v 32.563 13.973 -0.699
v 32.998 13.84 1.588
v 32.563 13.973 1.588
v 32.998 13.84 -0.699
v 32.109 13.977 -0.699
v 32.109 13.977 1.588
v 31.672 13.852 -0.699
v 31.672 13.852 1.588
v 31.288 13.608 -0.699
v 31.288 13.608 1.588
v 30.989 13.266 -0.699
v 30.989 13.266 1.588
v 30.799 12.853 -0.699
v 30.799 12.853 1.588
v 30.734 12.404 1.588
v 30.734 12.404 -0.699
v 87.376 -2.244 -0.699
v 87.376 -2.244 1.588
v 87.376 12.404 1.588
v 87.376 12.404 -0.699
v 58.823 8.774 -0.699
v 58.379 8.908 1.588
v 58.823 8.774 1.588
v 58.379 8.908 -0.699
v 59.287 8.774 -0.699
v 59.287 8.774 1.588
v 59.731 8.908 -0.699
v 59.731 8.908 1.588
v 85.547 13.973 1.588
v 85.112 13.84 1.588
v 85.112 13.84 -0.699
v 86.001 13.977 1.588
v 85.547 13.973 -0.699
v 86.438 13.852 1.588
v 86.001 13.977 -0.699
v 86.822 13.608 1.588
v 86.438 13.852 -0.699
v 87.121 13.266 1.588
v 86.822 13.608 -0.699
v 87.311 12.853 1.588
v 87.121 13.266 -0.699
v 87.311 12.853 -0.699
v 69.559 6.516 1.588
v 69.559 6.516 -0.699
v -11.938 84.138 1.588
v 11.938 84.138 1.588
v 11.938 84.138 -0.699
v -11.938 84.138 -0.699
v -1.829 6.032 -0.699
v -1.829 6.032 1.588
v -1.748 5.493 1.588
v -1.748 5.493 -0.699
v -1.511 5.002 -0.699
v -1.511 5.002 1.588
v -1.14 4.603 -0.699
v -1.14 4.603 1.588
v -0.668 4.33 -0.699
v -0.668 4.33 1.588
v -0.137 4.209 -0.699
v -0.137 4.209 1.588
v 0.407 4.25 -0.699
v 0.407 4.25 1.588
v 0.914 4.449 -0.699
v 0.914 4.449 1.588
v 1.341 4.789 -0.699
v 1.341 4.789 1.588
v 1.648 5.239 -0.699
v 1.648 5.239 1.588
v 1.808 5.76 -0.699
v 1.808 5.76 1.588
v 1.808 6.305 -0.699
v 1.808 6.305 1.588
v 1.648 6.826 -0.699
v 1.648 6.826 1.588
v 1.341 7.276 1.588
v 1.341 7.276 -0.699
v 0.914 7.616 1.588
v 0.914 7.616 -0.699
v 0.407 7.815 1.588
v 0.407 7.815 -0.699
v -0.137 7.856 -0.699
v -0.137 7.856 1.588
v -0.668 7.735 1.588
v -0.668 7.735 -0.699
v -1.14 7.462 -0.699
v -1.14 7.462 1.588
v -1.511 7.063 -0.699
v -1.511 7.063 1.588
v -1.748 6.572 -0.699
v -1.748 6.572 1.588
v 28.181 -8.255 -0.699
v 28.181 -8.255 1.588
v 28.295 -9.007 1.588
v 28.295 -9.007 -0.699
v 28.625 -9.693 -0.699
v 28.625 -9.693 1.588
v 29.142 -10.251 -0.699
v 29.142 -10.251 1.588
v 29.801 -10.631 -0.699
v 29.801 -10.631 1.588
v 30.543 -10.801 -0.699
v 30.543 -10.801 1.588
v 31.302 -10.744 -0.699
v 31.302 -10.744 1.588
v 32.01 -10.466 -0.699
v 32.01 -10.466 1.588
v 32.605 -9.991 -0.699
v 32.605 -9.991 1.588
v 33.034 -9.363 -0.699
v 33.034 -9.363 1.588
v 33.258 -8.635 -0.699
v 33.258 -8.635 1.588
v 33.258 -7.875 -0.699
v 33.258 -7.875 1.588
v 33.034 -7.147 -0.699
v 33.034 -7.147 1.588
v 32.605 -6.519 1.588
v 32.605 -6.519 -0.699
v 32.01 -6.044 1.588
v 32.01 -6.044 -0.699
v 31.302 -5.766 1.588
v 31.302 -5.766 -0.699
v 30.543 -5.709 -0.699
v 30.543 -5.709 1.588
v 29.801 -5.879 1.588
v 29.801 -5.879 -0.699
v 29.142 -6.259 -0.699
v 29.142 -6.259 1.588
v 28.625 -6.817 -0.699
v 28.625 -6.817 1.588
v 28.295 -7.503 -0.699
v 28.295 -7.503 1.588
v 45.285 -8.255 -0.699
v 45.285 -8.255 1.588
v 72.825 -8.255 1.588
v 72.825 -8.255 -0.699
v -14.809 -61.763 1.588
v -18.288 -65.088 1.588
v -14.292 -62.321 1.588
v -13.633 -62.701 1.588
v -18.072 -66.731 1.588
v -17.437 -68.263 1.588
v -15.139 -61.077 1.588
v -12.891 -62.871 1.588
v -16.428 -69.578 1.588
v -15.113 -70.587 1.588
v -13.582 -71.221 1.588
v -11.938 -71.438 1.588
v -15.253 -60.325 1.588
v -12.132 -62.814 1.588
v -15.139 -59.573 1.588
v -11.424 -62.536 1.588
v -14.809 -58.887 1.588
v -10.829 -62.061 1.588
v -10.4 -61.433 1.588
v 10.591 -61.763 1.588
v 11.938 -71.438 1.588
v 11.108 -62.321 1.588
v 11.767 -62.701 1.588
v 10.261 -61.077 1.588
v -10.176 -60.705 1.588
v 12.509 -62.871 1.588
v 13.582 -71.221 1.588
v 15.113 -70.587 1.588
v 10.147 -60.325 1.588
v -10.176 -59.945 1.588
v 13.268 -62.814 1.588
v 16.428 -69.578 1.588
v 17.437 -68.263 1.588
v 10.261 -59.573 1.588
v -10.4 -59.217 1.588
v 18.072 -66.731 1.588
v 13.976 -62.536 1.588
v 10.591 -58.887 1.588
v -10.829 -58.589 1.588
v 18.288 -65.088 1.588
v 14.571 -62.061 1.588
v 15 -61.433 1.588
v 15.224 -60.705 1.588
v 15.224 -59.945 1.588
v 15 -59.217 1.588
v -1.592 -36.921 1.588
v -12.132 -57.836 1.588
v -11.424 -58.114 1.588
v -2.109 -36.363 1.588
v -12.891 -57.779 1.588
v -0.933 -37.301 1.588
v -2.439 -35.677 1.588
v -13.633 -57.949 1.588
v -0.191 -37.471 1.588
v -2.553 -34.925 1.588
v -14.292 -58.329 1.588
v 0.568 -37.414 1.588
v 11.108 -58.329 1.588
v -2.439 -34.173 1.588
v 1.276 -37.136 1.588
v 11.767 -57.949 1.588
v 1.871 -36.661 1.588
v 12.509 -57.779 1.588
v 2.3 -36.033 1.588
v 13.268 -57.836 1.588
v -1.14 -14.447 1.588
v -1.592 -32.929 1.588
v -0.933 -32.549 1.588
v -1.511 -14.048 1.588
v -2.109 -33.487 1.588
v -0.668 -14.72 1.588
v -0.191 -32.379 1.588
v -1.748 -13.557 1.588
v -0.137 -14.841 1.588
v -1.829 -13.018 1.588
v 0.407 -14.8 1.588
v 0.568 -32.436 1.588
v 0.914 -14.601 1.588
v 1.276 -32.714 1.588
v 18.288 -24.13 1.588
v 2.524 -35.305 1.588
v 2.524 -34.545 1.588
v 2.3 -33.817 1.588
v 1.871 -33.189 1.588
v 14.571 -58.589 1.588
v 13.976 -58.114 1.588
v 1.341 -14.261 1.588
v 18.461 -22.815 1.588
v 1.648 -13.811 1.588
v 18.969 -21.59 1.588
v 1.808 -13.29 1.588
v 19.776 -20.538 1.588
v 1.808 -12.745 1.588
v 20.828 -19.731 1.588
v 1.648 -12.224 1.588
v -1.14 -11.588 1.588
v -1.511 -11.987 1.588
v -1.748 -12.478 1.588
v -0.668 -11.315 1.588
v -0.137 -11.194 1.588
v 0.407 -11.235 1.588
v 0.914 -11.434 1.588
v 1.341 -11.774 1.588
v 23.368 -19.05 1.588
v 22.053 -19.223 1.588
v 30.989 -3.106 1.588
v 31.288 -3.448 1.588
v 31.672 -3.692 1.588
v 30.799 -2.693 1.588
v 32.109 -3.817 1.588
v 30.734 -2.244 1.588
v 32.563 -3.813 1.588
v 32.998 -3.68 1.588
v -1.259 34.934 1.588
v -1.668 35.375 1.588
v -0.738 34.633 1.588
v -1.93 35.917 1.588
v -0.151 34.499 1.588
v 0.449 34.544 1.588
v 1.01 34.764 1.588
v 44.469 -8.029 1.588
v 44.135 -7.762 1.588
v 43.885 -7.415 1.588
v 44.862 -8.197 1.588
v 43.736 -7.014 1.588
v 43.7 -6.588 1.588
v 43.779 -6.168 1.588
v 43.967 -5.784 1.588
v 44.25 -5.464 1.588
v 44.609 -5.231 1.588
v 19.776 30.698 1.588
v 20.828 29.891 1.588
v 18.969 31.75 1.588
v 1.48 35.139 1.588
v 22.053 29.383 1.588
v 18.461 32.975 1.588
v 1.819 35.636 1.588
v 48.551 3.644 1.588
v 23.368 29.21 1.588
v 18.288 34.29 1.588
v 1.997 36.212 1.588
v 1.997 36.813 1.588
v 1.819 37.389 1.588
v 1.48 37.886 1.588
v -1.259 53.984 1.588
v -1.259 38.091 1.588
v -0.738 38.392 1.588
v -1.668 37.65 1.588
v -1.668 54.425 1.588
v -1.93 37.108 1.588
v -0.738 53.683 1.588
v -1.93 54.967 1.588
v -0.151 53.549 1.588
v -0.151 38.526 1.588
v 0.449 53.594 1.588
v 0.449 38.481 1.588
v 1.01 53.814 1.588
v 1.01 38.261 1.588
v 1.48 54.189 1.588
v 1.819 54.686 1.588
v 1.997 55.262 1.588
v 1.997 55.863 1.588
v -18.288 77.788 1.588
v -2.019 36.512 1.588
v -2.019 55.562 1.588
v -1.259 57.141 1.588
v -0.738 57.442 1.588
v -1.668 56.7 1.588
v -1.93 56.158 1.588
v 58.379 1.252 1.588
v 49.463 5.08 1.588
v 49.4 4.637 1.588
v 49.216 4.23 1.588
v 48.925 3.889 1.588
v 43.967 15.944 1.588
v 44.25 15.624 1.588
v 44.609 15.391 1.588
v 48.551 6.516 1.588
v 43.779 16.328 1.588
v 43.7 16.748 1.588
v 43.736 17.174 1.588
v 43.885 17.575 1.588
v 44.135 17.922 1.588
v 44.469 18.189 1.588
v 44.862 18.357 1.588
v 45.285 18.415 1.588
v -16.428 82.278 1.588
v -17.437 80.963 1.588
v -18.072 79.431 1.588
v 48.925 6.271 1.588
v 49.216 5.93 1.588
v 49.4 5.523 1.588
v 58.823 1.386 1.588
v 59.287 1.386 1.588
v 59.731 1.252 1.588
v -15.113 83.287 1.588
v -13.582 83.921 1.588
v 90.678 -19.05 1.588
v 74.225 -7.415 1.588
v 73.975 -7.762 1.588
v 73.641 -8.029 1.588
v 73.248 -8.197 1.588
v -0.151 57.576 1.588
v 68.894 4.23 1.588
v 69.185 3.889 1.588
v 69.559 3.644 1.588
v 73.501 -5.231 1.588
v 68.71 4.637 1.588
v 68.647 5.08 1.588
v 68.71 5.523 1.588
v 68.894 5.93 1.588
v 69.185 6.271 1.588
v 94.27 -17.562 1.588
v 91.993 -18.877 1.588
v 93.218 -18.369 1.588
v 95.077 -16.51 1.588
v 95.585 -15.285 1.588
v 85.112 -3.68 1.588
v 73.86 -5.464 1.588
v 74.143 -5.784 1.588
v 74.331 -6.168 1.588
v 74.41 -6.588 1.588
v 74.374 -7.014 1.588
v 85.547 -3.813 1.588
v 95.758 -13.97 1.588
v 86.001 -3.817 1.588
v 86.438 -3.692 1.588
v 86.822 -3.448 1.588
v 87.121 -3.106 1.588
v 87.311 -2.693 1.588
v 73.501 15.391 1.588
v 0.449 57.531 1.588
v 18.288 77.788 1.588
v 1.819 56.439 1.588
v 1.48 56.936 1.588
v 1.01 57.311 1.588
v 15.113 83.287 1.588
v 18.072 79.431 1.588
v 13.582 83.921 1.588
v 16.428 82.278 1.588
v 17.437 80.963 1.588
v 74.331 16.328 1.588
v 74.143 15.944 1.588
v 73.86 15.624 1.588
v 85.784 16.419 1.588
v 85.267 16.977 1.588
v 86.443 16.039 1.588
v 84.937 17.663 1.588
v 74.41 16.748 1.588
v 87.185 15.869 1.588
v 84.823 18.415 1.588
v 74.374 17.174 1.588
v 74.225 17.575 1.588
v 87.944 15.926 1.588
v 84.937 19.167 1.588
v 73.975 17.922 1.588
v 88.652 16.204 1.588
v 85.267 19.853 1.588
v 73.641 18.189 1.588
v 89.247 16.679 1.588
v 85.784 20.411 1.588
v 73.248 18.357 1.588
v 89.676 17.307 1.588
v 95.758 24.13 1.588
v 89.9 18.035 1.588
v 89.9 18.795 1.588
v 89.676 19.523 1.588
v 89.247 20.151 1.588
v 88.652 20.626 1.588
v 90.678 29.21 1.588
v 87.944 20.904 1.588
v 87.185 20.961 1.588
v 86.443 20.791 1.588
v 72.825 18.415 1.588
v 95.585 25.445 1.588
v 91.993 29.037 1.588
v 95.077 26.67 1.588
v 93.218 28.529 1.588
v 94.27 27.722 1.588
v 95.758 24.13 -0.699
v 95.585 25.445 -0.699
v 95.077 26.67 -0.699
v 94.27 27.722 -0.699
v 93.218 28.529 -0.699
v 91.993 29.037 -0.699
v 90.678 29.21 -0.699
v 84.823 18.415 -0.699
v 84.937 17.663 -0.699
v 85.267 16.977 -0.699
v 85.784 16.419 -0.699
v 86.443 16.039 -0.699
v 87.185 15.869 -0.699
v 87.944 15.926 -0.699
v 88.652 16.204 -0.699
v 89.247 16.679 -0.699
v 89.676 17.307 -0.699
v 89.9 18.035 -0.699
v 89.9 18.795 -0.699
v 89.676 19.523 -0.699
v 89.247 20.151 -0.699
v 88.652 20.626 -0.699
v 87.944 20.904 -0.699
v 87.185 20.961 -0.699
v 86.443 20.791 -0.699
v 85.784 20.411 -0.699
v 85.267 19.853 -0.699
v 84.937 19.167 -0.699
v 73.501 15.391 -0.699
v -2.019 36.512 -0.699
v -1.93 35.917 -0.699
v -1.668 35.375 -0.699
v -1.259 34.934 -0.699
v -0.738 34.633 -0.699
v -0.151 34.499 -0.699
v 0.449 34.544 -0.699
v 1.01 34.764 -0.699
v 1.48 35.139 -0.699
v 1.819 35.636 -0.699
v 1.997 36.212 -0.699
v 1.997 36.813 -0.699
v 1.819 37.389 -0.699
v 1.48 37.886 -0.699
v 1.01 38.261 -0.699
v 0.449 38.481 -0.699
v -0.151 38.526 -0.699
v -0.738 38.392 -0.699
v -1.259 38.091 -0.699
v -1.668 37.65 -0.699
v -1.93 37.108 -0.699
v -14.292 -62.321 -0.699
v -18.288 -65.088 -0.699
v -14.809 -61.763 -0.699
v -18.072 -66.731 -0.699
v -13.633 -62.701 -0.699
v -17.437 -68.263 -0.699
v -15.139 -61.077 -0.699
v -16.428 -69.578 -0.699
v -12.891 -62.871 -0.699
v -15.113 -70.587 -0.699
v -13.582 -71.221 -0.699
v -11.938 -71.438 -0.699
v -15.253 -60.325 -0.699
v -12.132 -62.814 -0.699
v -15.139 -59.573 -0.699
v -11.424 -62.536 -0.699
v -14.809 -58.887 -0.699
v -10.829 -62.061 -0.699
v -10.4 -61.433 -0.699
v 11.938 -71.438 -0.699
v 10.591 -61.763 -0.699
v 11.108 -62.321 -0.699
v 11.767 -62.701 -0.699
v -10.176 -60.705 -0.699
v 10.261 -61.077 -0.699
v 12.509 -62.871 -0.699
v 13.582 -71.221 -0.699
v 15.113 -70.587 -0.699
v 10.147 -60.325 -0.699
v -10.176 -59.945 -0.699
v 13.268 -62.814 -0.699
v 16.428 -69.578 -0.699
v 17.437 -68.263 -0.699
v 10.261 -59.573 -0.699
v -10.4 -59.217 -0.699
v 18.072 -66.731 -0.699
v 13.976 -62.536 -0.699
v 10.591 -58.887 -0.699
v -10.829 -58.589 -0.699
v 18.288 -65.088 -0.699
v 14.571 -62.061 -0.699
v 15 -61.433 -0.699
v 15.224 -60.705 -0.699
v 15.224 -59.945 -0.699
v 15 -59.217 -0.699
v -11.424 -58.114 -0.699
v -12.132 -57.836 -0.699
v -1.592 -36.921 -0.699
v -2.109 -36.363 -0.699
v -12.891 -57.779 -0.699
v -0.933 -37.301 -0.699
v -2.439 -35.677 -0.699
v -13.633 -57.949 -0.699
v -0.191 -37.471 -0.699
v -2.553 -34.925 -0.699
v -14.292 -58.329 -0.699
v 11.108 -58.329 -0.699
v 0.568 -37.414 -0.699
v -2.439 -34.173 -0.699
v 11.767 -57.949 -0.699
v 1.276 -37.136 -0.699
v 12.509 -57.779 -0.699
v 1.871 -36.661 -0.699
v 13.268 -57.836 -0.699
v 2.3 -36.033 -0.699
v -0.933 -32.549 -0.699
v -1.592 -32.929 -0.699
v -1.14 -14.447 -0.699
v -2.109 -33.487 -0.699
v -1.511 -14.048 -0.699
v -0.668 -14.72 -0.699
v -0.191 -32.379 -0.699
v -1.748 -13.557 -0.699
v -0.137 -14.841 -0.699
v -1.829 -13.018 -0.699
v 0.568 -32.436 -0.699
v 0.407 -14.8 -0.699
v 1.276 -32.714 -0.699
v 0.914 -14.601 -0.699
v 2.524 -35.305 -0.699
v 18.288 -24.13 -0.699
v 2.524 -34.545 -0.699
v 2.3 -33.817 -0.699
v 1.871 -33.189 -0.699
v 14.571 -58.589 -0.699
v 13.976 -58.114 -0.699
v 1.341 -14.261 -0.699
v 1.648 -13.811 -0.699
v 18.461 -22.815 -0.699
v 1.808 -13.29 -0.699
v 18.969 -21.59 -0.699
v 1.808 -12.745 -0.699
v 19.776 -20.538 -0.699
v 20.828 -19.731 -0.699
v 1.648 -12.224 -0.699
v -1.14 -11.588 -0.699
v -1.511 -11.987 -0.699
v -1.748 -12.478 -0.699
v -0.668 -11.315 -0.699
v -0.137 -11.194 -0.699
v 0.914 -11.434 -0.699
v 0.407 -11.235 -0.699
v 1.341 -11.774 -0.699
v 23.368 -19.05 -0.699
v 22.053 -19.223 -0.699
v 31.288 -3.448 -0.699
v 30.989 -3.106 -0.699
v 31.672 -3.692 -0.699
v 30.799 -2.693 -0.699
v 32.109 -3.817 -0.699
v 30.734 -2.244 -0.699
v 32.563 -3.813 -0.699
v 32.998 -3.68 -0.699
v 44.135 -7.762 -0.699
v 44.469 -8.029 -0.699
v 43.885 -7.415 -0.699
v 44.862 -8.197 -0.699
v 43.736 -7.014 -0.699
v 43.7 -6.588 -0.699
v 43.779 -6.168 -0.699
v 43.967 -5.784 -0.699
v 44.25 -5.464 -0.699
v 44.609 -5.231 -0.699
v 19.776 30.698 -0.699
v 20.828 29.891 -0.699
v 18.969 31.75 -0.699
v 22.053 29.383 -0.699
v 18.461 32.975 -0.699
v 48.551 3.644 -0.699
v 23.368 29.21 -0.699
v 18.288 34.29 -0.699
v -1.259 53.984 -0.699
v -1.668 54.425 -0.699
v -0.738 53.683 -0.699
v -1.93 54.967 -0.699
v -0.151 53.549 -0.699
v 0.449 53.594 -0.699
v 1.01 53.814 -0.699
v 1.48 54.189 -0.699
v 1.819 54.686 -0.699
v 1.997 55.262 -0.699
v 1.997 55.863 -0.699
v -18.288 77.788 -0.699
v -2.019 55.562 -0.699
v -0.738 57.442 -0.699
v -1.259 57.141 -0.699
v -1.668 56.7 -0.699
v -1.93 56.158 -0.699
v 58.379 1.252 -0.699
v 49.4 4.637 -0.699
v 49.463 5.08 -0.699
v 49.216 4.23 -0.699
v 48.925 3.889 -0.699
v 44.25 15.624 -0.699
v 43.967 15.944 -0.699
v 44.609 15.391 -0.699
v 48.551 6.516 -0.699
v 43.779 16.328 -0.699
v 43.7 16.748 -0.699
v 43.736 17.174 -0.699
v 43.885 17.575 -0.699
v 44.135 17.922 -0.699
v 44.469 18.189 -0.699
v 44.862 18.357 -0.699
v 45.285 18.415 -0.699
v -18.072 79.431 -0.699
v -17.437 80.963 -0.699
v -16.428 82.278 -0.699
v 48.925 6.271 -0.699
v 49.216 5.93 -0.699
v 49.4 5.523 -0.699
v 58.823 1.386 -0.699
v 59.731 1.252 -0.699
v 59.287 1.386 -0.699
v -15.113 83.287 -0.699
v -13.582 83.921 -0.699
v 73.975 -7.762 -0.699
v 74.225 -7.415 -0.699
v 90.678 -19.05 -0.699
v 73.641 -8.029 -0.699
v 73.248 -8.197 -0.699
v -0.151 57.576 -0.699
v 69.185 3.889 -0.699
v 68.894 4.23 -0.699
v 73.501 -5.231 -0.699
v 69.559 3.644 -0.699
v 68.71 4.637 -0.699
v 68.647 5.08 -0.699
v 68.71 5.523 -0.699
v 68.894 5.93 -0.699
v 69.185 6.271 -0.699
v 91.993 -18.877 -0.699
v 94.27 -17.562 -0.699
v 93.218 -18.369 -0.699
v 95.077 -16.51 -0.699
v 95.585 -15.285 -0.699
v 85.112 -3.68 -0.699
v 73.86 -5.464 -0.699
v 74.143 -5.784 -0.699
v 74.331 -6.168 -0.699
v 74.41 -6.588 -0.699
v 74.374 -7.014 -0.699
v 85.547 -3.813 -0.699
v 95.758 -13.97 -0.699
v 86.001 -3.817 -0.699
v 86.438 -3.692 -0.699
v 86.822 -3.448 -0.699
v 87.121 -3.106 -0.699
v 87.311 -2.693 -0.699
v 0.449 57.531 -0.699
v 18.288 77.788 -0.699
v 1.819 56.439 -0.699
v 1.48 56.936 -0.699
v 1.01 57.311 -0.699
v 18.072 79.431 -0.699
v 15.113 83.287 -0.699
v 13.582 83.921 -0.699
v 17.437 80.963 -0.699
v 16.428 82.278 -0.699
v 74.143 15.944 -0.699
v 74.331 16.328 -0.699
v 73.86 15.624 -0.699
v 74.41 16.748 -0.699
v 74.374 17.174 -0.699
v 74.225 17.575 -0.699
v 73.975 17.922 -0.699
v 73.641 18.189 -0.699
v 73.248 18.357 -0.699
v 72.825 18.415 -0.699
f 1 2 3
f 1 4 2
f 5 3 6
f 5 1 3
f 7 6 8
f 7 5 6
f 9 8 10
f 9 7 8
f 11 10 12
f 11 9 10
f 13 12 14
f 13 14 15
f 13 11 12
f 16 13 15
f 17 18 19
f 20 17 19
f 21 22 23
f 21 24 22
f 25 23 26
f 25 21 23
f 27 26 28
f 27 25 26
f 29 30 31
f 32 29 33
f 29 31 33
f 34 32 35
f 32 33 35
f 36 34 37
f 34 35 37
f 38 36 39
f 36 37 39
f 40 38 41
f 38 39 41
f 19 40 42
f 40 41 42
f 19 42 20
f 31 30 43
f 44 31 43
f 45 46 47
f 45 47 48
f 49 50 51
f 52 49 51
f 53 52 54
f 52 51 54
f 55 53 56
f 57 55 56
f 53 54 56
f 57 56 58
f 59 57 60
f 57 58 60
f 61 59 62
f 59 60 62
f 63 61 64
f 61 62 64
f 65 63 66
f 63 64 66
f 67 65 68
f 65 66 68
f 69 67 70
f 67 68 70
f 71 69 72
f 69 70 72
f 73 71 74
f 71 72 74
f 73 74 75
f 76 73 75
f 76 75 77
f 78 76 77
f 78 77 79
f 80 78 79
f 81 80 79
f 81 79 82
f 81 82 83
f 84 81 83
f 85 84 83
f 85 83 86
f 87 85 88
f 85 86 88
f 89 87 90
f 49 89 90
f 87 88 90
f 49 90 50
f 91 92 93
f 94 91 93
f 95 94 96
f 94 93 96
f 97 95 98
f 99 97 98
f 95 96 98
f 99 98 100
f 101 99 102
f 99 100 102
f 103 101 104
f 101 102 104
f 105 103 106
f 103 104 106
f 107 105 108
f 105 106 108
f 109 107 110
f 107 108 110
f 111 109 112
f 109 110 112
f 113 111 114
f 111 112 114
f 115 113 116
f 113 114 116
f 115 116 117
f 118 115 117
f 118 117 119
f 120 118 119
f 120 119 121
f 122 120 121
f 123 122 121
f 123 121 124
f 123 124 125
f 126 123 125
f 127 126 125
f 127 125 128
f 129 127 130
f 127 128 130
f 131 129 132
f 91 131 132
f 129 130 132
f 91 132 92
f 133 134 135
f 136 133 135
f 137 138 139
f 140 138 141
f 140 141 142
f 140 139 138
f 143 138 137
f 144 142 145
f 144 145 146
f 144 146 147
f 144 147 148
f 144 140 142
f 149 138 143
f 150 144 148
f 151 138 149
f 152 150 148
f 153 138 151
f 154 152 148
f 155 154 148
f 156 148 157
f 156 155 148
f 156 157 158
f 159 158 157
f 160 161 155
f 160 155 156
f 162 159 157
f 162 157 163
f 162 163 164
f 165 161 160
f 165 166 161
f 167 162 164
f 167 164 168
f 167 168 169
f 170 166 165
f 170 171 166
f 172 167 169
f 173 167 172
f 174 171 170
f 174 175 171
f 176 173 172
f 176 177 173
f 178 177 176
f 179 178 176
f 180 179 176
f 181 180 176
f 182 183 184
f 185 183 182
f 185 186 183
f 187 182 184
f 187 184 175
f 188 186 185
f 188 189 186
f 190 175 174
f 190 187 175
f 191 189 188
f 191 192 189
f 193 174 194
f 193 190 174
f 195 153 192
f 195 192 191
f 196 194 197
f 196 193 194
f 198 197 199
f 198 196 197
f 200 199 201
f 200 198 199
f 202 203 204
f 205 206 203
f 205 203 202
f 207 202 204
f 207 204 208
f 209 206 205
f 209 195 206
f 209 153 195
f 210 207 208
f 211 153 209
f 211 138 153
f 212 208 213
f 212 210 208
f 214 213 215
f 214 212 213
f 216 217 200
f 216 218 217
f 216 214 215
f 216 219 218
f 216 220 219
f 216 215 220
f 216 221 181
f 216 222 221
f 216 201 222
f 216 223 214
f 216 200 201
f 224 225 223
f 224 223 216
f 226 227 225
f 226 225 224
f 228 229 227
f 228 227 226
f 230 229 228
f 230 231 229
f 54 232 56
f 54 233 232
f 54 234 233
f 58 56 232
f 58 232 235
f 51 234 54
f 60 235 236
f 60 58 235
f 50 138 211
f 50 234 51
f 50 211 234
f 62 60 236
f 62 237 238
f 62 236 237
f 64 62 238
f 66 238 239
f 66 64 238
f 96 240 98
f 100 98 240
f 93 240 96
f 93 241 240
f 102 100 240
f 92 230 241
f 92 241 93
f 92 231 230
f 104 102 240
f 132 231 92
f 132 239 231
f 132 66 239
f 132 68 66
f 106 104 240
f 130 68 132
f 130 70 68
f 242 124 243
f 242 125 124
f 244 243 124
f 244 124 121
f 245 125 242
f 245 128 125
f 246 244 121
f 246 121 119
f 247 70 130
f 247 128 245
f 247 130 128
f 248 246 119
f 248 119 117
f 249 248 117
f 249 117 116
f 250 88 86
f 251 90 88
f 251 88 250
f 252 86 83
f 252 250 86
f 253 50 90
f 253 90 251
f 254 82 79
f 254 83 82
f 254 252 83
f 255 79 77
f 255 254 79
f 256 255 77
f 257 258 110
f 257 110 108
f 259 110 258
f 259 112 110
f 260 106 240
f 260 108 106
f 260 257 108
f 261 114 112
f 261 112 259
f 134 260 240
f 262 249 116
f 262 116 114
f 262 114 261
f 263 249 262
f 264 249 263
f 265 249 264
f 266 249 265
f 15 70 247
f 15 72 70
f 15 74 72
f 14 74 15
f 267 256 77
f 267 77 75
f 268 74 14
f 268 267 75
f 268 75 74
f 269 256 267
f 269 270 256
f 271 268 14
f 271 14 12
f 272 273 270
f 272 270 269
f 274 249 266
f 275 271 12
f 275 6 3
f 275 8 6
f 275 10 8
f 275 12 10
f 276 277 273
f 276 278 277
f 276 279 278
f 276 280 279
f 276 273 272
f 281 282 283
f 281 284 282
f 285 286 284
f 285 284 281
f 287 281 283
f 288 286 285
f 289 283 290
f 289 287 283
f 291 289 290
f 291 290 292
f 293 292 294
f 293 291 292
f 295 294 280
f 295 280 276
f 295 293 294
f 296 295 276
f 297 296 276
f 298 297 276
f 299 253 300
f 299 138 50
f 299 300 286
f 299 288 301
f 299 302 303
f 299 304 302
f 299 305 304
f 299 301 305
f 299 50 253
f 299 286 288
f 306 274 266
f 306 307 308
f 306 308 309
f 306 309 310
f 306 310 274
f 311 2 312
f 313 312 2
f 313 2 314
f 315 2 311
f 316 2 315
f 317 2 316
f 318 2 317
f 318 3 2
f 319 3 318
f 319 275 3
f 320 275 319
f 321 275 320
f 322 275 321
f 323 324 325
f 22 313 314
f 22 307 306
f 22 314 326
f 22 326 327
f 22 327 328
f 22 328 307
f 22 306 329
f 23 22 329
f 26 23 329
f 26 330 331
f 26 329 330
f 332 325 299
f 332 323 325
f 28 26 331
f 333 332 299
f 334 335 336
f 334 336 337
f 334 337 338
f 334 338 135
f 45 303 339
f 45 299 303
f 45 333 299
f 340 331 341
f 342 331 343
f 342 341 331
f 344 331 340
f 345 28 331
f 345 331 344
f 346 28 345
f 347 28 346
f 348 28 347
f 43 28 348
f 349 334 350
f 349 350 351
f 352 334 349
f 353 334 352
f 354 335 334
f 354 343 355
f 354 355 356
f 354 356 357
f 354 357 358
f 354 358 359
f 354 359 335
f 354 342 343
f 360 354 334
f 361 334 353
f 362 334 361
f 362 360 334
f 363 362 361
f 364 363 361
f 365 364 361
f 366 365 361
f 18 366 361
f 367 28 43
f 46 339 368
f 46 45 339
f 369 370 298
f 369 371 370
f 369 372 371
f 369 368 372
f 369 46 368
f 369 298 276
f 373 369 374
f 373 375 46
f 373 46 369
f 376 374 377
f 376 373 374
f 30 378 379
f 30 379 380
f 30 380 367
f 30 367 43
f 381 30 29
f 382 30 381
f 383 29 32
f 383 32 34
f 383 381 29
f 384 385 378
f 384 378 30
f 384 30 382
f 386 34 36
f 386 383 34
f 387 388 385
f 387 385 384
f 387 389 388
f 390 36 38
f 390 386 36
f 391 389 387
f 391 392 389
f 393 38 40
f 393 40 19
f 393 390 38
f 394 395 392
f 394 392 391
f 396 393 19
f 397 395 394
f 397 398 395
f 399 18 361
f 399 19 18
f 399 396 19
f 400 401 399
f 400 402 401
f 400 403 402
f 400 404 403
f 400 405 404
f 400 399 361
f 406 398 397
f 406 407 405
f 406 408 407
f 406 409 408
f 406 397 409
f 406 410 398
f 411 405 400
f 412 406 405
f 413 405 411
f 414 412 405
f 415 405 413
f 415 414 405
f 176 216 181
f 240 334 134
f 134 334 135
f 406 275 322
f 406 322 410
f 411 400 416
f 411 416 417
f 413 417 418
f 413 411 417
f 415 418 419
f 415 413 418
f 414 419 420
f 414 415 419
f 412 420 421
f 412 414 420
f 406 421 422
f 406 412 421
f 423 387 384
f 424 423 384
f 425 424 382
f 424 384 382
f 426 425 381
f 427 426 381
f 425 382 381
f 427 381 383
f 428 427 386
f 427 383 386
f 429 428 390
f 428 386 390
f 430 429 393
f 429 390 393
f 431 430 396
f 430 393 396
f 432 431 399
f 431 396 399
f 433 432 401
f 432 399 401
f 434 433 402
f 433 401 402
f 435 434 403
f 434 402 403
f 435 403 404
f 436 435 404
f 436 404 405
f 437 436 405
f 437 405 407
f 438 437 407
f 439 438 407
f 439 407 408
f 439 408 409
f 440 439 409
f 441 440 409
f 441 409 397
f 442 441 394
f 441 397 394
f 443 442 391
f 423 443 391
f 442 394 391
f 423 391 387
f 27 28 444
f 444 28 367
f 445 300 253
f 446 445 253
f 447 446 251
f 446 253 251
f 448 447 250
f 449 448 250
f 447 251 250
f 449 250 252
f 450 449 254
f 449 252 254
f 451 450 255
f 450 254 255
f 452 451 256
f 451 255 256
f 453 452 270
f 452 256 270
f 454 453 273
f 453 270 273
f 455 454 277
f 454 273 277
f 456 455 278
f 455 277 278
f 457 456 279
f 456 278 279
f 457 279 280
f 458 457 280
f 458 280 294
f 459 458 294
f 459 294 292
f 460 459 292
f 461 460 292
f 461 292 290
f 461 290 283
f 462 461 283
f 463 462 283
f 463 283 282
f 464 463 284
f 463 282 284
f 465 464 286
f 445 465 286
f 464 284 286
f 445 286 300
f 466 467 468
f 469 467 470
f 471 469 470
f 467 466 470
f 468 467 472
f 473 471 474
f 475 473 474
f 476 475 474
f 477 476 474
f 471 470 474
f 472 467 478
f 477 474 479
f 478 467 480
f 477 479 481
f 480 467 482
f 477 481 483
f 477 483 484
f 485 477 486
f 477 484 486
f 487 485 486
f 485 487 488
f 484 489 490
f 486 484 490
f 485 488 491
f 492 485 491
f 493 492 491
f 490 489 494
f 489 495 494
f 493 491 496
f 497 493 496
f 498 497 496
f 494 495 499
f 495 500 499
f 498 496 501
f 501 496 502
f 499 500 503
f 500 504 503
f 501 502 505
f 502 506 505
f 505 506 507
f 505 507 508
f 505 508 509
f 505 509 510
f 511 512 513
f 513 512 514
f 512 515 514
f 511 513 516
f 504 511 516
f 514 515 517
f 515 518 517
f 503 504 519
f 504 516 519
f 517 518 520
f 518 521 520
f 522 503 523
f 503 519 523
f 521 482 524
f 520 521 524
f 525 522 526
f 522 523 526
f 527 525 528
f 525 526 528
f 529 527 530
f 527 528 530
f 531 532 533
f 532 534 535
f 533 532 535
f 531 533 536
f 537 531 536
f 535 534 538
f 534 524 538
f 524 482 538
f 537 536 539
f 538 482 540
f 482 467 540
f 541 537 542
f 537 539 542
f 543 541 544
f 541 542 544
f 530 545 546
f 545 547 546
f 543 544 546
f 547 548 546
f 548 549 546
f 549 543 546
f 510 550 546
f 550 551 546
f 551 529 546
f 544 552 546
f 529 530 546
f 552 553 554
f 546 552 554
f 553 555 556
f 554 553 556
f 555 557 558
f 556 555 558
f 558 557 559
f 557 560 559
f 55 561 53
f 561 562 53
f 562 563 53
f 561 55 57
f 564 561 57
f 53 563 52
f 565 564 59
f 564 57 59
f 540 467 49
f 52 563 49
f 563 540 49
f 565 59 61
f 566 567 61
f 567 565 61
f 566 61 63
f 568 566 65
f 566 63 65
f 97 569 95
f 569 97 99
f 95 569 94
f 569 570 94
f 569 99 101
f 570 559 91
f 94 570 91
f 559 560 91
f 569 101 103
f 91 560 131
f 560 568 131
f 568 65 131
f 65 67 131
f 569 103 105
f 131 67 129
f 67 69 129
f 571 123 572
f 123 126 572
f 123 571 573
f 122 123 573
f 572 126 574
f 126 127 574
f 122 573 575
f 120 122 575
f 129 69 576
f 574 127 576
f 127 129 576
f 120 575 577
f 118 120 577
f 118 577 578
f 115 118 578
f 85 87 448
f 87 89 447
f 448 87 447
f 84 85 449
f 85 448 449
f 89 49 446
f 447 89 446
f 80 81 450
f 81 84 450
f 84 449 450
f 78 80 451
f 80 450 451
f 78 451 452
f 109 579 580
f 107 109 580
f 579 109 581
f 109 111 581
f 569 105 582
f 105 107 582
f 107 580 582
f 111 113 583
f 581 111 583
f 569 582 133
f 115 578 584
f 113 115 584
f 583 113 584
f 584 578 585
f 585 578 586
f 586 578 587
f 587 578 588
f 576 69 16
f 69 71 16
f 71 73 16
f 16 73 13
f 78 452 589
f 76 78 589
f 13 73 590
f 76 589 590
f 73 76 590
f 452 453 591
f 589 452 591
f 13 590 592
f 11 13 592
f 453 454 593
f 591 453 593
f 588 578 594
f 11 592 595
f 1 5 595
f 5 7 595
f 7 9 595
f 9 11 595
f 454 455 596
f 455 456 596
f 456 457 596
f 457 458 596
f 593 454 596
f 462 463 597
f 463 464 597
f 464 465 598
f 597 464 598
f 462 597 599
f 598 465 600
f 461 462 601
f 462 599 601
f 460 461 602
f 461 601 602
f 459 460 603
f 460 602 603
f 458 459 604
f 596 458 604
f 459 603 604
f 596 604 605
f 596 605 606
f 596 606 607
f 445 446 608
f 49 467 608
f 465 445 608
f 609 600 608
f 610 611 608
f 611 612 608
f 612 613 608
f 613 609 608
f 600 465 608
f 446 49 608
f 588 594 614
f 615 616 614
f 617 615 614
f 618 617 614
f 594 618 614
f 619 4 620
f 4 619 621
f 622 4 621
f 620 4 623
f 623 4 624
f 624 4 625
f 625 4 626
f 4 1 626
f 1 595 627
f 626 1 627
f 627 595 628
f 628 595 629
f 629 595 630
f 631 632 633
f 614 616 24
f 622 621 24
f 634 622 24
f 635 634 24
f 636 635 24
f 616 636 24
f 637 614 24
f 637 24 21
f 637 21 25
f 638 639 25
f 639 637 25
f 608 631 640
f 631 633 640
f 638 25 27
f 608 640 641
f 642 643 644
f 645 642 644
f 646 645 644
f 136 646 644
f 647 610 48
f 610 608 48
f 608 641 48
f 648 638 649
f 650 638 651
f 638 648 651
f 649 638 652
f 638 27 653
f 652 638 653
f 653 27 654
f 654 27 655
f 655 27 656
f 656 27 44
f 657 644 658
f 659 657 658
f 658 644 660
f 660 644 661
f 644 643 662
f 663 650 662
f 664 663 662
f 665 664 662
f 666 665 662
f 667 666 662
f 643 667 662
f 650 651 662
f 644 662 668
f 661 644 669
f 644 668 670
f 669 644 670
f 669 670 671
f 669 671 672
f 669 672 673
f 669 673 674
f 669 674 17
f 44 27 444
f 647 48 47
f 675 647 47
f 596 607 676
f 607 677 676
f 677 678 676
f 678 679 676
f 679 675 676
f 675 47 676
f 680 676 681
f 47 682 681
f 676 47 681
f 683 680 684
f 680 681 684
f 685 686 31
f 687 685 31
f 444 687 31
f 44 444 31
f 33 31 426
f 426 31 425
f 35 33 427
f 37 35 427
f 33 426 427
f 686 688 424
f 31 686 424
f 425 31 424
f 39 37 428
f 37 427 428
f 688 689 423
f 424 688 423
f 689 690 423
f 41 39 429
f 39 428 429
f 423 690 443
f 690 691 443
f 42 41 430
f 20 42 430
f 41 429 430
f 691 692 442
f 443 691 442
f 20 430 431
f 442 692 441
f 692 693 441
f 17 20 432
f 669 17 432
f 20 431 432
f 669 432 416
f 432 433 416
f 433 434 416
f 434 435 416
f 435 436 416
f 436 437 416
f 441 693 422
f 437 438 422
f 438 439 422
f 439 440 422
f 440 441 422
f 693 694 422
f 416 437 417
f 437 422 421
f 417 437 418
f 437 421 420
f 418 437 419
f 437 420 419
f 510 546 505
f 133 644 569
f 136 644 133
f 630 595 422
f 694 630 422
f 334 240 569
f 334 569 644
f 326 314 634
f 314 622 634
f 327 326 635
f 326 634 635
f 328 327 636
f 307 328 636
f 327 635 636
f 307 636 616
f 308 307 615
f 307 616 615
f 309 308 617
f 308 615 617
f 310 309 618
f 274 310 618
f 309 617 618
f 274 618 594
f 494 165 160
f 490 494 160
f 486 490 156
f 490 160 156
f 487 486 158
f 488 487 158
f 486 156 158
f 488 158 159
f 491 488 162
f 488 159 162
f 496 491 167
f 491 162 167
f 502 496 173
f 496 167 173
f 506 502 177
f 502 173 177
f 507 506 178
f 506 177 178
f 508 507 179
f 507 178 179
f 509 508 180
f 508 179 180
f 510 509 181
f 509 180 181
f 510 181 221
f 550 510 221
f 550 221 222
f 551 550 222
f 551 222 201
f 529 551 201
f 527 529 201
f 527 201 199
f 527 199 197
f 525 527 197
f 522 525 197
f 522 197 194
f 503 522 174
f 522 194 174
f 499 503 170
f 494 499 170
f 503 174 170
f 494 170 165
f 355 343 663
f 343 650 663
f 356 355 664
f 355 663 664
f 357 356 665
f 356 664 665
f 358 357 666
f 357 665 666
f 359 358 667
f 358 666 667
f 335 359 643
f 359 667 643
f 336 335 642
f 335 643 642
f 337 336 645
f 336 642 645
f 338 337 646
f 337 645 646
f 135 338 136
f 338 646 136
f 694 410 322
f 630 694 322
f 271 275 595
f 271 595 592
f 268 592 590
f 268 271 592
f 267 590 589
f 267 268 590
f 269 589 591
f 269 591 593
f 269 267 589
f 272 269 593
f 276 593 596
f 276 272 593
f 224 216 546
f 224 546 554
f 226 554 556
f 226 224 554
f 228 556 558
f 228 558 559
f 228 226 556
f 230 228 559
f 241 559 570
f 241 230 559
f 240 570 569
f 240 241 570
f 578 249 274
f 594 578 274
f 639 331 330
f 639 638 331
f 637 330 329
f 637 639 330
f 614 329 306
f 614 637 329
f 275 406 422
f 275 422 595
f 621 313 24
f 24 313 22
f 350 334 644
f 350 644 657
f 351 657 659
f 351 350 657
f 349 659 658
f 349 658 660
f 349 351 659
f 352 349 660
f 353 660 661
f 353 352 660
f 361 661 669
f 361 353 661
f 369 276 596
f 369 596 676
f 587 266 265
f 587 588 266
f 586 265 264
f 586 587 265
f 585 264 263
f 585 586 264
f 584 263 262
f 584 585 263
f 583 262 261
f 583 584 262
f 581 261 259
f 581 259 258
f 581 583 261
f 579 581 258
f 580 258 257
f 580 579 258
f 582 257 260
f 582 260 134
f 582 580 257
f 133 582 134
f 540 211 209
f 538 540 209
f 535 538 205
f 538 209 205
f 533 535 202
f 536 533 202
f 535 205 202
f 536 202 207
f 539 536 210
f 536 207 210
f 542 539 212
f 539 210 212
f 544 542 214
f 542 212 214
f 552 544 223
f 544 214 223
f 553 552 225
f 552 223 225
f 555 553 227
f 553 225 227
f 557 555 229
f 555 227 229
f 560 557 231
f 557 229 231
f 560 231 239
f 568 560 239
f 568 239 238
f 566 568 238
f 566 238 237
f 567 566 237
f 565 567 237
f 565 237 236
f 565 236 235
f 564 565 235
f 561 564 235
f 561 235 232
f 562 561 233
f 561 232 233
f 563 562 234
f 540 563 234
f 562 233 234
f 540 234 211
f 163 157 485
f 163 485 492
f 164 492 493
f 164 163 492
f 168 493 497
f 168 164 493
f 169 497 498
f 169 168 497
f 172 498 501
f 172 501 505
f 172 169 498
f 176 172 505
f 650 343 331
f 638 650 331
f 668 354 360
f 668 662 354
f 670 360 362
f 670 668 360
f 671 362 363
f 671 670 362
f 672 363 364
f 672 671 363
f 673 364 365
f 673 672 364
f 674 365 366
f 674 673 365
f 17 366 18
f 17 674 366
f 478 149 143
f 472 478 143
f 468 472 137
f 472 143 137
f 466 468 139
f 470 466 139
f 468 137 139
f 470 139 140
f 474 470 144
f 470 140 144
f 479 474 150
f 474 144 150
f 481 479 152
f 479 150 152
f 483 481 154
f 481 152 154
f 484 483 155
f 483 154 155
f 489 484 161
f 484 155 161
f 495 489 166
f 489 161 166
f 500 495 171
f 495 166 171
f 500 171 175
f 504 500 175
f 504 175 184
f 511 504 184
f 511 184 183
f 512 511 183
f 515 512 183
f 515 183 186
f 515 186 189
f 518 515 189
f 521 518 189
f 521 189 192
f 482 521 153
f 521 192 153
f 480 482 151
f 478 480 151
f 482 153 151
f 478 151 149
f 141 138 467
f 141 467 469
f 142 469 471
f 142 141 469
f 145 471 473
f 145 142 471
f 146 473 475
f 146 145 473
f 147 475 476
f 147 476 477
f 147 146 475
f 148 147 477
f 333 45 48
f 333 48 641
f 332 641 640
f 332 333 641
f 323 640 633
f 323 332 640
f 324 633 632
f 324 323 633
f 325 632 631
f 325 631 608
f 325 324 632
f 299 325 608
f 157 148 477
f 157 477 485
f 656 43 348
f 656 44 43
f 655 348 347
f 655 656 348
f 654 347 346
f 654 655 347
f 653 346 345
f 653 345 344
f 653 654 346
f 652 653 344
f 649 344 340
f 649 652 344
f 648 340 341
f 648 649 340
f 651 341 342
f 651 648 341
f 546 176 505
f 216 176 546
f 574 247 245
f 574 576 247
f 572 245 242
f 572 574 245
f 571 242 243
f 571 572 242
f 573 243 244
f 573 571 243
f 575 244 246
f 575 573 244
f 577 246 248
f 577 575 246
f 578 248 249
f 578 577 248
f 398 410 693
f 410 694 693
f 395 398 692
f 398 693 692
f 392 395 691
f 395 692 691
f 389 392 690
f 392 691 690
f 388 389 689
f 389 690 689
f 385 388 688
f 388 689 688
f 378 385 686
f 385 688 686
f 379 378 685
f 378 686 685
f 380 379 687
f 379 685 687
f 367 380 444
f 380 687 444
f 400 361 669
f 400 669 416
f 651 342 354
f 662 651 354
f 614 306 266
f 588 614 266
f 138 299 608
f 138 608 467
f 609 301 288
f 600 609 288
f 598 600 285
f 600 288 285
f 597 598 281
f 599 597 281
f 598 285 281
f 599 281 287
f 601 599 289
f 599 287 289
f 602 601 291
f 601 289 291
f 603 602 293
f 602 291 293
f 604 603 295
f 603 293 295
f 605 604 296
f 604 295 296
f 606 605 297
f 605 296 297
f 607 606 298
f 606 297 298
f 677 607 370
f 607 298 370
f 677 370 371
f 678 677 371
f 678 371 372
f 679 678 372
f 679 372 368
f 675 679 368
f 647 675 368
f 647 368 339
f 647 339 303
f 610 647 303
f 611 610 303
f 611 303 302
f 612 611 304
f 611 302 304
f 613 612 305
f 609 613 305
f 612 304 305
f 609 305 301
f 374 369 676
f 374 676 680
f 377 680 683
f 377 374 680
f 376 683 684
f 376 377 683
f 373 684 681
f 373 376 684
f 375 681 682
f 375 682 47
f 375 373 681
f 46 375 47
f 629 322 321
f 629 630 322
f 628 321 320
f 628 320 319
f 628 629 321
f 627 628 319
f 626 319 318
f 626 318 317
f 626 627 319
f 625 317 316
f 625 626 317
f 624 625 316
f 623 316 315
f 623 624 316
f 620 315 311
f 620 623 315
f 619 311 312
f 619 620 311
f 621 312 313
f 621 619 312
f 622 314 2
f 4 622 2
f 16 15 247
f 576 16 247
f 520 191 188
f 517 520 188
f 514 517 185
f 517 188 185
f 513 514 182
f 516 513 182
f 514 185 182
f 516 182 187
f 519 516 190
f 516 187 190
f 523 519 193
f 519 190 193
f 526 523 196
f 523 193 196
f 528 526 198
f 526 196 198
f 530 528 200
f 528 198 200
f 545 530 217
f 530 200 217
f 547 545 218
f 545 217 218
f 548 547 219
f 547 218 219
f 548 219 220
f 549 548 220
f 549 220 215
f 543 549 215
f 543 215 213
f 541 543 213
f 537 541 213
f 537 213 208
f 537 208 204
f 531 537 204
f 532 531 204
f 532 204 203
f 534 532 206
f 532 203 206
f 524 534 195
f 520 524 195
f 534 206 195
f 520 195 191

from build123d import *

# Parameters (mm, degrees)
SKETCH1_R           = 2.5527
SKETCH1_R_2         = 1.8288
SKETCH1_R_3         = 2.0193
BOSS_EXTRUDE1_DEPTH = 2.286
CUT_EXTRUDE1_DEPTH  = 128.490937977
FILLET1_R           = 1.5875


with BuildPart() as part:
    # Sketch1 → Boss-Extrude1 (new body)
    with BuildSketch(Plane.XY.offset(1.5875)):
        with BuildLine():
            Line((18.288, -65.0875), (18.288, -24.13))
            ThreePointArc((18.288, -24.13), (19.775897552, -20.537897552), (23.368, -19.05))
            Line((23.368, -19.05), (90.678, -19.05))
            ThreePointArc((90.678, -19.05), (94.270102448, -17.562102448), (95.758, -13.97))
            Line((95.758, -13.97), (95.758, 24.13))
            ThreePointArc((95.758, 24.13), (94.270102448, 27.722102448), (90.678, 29.21))
            Line((90.678, 29.21), (23.368, 29.21))
            ThreePointArc((23.368, 29.21), (19.775897552, 30.697897552), (18.288, 34.29))
            Line((18.288, 34.29), (18.288, 77.7875))
            ThreePointArc((18.288, 77.7875), (16.428128061, 82.277628061), (11.938, 84.1375))
            Line((11.938, 84.1375), (-11.938, 84.1375))
            ThreePointArc((-11.938, 84.1375), (-16.428128061, 82.277628061), (-18.288, 77.7875))
            Line((-18.288, 77.7875), (-18.288, -65.0875))
            ThreePointArc((-18.288, -65.0875), (-16.428128061, -69.577628061), (-11.938, -71.4375))
            Line((-11.938, -71.4375), (11.938, -71.4375))
            ThreePointArc((11.938, -71.4375), (16.428128061, -69.577628061), (18.288, -65.0875))
        make_face()
        with Locations(Location((87.376, 18.415, 0), (0, 0, 180))):
            Circle(SKETCH1_R, mode=Mode.SUBTRACT)
        with Locations(Location((30.734, -8.255, 0), (0, 0, 180))):
            Circle(SKETCH1_R, mode=Mode.SUBTRACT)
        with Locations(Location((0, -13.0175, 0), (0, 0, 180))):
            Circle(SKETCH1_R_2, mode=Mode.SUBTRACT)
        with Locations(Location((0, 6.0325, 0), (0, 0, 180))):
            Circle(SKETCH1_R_2, mode=Mode.SUBTRACT)
        with Locations(Location((0, 36.5125, 0), (0, 0, 180))):
            Circle(SKETCH1_R_3, mode=Mode.SUBTRACT)
        with Locations(Location((0, 55.5625, 0), (0, 0, 180))):
            Circle(SKETCH1_R_3, mode=Mode.SUBTRACT)
        with Locations(Location((12.7, -60.325, 0), (0, 0, 180))):
            Circle(SKETCH1_R, mode=Mode.SUBTRACT)
        with Locations(Location((-12.7, -60.325, 0), (0, 0, 180))):
            Circle(SKETCH1_R, mode=Mode.SUBTRACT)
        with Locations(Location((0, -34.925, 0), (0, 0, 180))):
            Circle(SKETCH1_R, mode=Mode.SUBTRACT)
    extrude(amount=-BOSS_EXTRUDE1_DEPTH)

    # Sketch2 → Cut-Extrude1 (cut, through all)
    with BuildSketch(Plane.XY.offset(1.5875)):
        Polygon((79.922815554, 18.415), (38.187184446, 18.415), (59.055, 8.589346937), align=None)
        Polygon((51.601815554, 5.08), (30.734, 14.905653063), (30.734, -4.745653063), align=None)
        Polygon((79.922815554, -8.255), (59.055, 1.570653063), (38.187184446, -8.255), align=None)
        Polygon((87.376, 14.905653063), (66.508184446, 5.08), (87.376, -4.745653063), align=None)
    extrude(amount=-CUT_EXTRUDE1_DEPTH, mode=Mode.SUBTRACT)

    # Fillet1
    fillet1_edges = [part.edges().sort_by_distance(p)[0] for p in [
        (30.734, 14.905653063, 0.4445),
        (51.601815554, 5.08, 0.4445),
        (59.055, 1.570653063, 0.4445),
        (79.922815554, -8.255, 0.4445),
        (38.187184446, -8.255, 0.4445),
        (66.508184446, 5.08, 0.4445),
        (87.376, 14.905653063, 0.4445),
        (87.376, -4.745653063, 0.4445),
        (38.187184446, 18.415, 0.4445),
        (79.922815554, 18.415, 0.4445),
        (59.055, 8.589346937, 0.4445),
        (30.734, -4.745653063, 0.4445),
    ]]
    fillet(fillet1_edges, radius=FILLET1_R)


solid = part.part
